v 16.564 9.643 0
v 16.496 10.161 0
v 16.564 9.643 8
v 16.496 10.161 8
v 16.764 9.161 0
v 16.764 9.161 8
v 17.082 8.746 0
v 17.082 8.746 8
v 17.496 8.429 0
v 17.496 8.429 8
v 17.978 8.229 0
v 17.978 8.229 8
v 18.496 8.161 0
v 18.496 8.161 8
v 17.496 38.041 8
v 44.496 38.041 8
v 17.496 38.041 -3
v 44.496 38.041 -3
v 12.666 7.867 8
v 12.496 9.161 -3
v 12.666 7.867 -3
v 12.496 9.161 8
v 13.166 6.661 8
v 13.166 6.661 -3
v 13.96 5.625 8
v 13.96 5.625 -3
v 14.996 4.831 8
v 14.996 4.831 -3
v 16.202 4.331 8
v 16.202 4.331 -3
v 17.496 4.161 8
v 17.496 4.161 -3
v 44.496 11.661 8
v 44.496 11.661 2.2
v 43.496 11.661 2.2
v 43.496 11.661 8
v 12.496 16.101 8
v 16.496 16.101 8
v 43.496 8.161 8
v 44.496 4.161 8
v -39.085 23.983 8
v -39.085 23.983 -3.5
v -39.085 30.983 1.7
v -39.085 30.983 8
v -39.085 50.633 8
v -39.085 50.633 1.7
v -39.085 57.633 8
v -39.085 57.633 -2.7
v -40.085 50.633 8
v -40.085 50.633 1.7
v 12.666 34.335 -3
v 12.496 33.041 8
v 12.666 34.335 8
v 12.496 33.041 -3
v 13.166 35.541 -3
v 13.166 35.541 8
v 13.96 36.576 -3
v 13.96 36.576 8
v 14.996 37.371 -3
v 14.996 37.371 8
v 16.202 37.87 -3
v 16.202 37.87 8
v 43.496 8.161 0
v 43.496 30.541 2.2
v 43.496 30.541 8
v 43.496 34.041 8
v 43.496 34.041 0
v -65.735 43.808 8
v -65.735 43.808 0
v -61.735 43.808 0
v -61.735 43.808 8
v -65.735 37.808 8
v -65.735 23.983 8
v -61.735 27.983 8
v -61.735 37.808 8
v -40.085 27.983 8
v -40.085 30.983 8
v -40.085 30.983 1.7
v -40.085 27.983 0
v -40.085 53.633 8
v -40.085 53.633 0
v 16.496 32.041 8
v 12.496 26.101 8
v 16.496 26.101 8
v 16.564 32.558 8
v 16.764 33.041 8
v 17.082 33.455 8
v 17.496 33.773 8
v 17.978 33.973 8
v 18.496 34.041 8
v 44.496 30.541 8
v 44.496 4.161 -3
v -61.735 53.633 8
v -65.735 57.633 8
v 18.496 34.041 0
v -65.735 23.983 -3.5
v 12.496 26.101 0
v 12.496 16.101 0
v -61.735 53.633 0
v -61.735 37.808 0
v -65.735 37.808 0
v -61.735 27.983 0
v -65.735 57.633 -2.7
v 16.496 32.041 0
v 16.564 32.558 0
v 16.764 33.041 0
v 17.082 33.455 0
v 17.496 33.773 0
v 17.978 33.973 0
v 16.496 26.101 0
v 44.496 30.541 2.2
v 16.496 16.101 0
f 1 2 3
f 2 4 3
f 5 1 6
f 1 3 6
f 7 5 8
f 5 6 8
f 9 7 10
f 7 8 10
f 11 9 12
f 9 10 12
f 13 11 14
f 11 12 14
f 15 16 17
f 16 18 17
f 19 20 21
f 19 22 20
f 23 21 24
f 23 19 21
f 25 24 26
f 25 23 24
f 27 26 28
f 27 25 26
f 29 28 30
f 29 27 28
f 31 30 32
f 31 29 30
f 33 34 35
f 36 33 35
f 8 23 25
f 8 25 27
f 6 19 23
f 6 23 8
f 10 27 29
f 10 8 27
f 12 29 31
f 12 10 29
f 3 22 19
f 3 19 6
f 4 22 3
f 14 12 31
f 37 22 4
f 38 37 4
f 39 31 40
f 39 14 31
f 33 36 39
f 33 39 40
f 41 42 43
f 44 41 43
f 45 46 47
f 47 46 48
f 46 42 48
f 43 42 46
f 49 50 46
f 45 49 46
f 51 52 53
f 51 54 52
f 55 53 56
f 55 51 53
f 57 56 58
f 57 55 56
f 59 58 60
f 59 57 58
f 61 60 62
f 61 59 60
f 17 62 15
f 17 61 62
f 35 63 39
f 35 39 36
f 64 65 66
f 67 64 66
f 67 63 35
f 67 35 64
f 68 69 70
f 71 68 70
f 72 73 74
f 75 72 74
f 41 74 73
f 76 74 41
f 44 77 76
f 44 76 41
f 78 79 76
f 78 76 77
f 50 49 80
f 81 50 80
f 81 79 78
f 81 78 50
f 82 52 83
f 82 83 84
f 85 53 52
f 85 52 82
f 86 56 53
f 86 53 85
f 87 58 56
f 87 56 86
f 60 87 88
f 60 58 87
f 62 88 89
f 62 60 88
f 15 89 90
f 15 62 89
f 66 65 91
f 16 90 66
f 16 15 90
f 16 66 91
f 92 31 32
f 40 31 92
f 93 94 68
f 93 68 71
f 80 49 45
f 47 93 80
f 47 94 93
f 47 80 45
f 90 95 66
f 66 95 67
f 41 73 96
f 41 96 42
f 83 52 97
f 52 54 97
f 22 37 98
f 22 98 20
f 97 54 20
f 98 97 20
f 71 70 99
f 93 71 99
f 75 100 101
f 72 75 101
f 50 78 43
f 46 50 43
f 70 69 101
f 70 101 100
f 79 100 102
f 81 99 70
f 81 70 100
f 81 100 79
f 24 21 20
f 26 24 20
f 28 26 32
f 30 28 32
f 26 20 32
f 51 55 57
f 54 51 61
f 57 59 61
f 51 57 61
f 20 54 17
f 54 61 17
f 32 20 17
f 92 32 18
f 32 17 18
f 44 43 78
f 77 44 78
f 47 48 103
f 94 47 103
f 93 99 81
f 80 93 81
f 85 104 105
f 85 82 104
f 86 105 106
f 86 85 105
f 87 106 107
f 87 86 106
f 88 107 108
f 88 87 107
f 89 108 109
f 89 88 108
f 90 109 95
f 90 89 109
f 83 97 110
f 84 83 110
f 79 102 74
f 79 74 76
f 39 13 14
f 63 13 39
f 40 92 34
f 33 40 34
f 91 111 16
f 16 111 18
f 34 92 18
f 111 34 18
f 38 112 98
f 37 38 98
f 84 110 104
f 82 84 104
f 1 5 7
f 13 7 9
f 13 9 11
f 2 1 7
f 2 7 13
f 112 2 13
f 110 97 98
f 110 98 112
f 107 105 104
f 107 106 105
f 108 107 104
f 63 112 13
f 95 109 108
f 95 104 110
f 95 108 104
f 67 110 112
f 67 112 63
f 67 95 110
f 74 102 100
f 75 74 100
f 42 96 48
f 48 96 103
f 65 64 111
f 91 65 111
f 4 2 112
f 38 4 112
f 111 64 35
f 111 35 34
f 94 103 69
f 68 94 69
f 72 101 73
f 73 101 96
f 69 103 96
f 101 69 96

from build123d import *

# Parameters (mm, degrees)
F0_W     = 21.65
F0_H     = 4
F0_W_2   = 1
F0_H_2   = 19.65
F1_DEPTH = 6
F2_DEPTH = 8
F3_DEPTH = 1.7
F5_DEPTH = 26.65
F0_W_3   = 27
F0_H_3   = 18.88
F6_DEPTH = 3
F7_DEPTH = 8
F8_DEPTH = 2.2
F9_R     = 2
F10_R    = 5


with BuildPart() as f1:
    # F0 (on Top) → F1 (new body)
    with BuildSketch(Plane.XY):
        Polygon((-65.734881, 57.633254), (-65.734881, 43.808254), (-61.734881, 43.808254), (-61.734881, 53.633254), (-61.734881, 57.633254), align=None)
        with Locations((-50.909881, 55.633254)):
            Rectangle(F0_W, F0_H)
        Polygon((-61.734881, 43.808254), (-65.734881, 43.808254), (-65.734881, 37.808254), (-61.734881, 37.808254), (-61.734881, 27.983254), (-40.084881, 27.983254), (-40.084881, 30.983254), (-40.084881, 50.633254), (-40.084881, 53.633254), (-61.734881, 53.633254), align=None)
        Polygon((-61.734881, 37.808254), (-65.734881, 37.808254), (-65.734881, 23.983254), (-61.734881, 23.983254), (-61.734881, 27.983254), align=None)
        with Locations((-50.909881, 25.983254)):
            Rectangle(F0_W, F0_H)
        Polygon((-40.084881, 30.983254), (-40.084881, 27.983254), (-40.084881, 23.983254), (-39.084881, 23.983254), (-39.084881, 30.983254), align=None)
        with Locations((-39.584881, 40.808254)):
            Rectangle(F0_W_2, F0_H_2)
        Polygon((-40.084881, 57.633254), (-40.084881, 53.633254), (-40.084881, 50.633254), (-39.084881, 50.633254), (-39.084881, 57.633254), align=None)
    extrude(amount=-F1_DEPTH)

    # F0 (on Top) → F2 (join)
    with BuildSketch(Plane.XY):
        Polygon((-65.734881, 57.633254), (-65.734881, 43.808254), (-61.734881, 43.808254), (-61.734881, 53.633254), (-61.734881, 57.633254), align=None)
        with Locations((-50.909881, 55.633254)):
            Rectangle(F0_W, F0_H)
        Polygon((-61.734881, 37.808254), (-65.734881, 37.808254), (-65.734881, 23.983254), (-61.734881, 23.983254), (-61.734881, 27.983254), align=None)
        with Locations((-50.909881, 25.983254)):
            Rectangle(F0_W, F0_H)
        Polygon((-40.084881, 30.983254), (-40.084881, 27.983254), (-40.084881, 23.983254), (-39.084881, 23.983254), (-39.084881, 30.983254), align=None)
        Polygon((-40.084881, 57.633254), (-40.084881, 53.633254), (-40.084881, 50.633254), (-39.084881, 50.633254), (-39.084881, 57.633254), align=None)
    extrude(amount=F2_DEPTH)

    # F0 (on Top) → F3 (join)
    with BuildSketch(Plane.XY):
        with Locations((-39.584881, 40.808254)):
            Rectangle(F0_W_2, F0_H_2)
    extrude(amount=F3_DEPTH)

    # F4 (on face) → F5 (cut, through all)
    with BuildSketch(Plane(origin=(-65.734881, 0, 0), x_dir=(0, -1, 0), z_dir=(-1, 0, 0))):
        Polygon((-23.983254, -3.5), (-57.633254, -2.7), (-57.633254, -6), (-23.983254, -6), align=None)
    extrude(amount=-F5_DEPTH, mode=Mode.SUBTRACT)


with BuildPart() as f6:
    # F0 (on Top) → F6 (new body)
    with BuildSketch(Plane.XY):
        Polygon((12.495861, 38.040668), (12.495861, 26.100668), (16.495861, 26.100668), (16.495861, 34.040668), (16.495861, 38.040668), align=None)
        with Locations((29.995861, 36.040668)):
            Rectangle(F0_W_3, F0_H)
        Polygon((43.495861, 38.040668), (43.495861, 34.040668), (43.495861, 30.540668), (44.495861, 30.540668), (44.495861, 38.040668), align=None)
        with Locations((43.995861, 21.100668)):
            Rectangle(F0_W_2, F0_H_3)
        Polygon((43.495861, 11.660668), (43.495861, 8.160668), (43.495861, 4.160668), (44.495861, 4.160668), (44.495861, 11.660668), align=None)
        with Locations((29.995861, 6.160668)):
            Rectangle(F0_W_3, F0_H)
        Polygon((16.495861, 16.100668), (12.495861, 16.100668), (12.495861, 4.160668), (16.495861, 4.160668), (16.495861, 8.160668), align=None)
        Polygon((16.495861, 26.100668), (12.495861, 26.100668), (12.495861, 16.100668), (16.495861, 16.100668), (16.495861, 8.160668), (43.495861, 8.160668), (43.495861, 11.660668), (43.495861, 30.540668), (43.495861, 34.040668), (16.495861, 34.040668), align=None)
    extrude(amount=-F6_DEPTH)

    # F0 (on Top) → F7 (join)
    with BuildSketch(Plane.XY):
        Polygon((12.495861, 38.040668), (12.495861, 26.100668), (16.495861, 26.100668), (16.495861, 34.040668), (16.495861, 38.040668), align=None)
        with Locations((29.995861, 36.040668)):
            Rectangle(F0_W_3, F0_H)
        Polygon((16.495861, 16.100668), (12.495861, 16.100668), (12.495861, 4.160668), (16.495861, 4.160668), (16.495861, 8.160668), align=None)
        with Locations((29.995861, 6.160668)):
            Rectangle(F0_W_3, F0_H)
        Polygon((43.495861, 11.660668), (43.495861, 8.160668), (43.495861, 4.160668), (44.495861, 4.160668), (44.495861, 11.660668), align=None)
        Polygon((43.495861, 38.040668), (43.495861, 34.040668), (43.495861, 30.540668), (44.495861, 30.540668), (44.495861, 38.040668), align=None)
    extrude(amount=F7_DEPTH)

    # F0 (on Top) → F8 (join)
    with BuildSketch(Plane.XY):
        with Locations((43.995861, 21.100668)):
            Rectangle(F0_W_2, F0_H_3)
    extrude(amount=F8_DEPTH)

    # F9
    f9_edges = [f6.edges().sort_by_distance(p)[0] for p in [
        (16.495861, 34.040668, 4),
        (16.495861, 8.160668, 4),
    ]]
    fillet(f9_edges, radius=F9_R)

    # F10
    f10_edges = [f6.edges().sort_by_distance(p)[0] for p in [
        (12.495861, 38.040668, 2.5),
        (12.495861, 4.160668, 2.5),
    ]]
    fillet(f10_edges, radius=F10_R)


solid = Compound([f1.part, f6.part])
